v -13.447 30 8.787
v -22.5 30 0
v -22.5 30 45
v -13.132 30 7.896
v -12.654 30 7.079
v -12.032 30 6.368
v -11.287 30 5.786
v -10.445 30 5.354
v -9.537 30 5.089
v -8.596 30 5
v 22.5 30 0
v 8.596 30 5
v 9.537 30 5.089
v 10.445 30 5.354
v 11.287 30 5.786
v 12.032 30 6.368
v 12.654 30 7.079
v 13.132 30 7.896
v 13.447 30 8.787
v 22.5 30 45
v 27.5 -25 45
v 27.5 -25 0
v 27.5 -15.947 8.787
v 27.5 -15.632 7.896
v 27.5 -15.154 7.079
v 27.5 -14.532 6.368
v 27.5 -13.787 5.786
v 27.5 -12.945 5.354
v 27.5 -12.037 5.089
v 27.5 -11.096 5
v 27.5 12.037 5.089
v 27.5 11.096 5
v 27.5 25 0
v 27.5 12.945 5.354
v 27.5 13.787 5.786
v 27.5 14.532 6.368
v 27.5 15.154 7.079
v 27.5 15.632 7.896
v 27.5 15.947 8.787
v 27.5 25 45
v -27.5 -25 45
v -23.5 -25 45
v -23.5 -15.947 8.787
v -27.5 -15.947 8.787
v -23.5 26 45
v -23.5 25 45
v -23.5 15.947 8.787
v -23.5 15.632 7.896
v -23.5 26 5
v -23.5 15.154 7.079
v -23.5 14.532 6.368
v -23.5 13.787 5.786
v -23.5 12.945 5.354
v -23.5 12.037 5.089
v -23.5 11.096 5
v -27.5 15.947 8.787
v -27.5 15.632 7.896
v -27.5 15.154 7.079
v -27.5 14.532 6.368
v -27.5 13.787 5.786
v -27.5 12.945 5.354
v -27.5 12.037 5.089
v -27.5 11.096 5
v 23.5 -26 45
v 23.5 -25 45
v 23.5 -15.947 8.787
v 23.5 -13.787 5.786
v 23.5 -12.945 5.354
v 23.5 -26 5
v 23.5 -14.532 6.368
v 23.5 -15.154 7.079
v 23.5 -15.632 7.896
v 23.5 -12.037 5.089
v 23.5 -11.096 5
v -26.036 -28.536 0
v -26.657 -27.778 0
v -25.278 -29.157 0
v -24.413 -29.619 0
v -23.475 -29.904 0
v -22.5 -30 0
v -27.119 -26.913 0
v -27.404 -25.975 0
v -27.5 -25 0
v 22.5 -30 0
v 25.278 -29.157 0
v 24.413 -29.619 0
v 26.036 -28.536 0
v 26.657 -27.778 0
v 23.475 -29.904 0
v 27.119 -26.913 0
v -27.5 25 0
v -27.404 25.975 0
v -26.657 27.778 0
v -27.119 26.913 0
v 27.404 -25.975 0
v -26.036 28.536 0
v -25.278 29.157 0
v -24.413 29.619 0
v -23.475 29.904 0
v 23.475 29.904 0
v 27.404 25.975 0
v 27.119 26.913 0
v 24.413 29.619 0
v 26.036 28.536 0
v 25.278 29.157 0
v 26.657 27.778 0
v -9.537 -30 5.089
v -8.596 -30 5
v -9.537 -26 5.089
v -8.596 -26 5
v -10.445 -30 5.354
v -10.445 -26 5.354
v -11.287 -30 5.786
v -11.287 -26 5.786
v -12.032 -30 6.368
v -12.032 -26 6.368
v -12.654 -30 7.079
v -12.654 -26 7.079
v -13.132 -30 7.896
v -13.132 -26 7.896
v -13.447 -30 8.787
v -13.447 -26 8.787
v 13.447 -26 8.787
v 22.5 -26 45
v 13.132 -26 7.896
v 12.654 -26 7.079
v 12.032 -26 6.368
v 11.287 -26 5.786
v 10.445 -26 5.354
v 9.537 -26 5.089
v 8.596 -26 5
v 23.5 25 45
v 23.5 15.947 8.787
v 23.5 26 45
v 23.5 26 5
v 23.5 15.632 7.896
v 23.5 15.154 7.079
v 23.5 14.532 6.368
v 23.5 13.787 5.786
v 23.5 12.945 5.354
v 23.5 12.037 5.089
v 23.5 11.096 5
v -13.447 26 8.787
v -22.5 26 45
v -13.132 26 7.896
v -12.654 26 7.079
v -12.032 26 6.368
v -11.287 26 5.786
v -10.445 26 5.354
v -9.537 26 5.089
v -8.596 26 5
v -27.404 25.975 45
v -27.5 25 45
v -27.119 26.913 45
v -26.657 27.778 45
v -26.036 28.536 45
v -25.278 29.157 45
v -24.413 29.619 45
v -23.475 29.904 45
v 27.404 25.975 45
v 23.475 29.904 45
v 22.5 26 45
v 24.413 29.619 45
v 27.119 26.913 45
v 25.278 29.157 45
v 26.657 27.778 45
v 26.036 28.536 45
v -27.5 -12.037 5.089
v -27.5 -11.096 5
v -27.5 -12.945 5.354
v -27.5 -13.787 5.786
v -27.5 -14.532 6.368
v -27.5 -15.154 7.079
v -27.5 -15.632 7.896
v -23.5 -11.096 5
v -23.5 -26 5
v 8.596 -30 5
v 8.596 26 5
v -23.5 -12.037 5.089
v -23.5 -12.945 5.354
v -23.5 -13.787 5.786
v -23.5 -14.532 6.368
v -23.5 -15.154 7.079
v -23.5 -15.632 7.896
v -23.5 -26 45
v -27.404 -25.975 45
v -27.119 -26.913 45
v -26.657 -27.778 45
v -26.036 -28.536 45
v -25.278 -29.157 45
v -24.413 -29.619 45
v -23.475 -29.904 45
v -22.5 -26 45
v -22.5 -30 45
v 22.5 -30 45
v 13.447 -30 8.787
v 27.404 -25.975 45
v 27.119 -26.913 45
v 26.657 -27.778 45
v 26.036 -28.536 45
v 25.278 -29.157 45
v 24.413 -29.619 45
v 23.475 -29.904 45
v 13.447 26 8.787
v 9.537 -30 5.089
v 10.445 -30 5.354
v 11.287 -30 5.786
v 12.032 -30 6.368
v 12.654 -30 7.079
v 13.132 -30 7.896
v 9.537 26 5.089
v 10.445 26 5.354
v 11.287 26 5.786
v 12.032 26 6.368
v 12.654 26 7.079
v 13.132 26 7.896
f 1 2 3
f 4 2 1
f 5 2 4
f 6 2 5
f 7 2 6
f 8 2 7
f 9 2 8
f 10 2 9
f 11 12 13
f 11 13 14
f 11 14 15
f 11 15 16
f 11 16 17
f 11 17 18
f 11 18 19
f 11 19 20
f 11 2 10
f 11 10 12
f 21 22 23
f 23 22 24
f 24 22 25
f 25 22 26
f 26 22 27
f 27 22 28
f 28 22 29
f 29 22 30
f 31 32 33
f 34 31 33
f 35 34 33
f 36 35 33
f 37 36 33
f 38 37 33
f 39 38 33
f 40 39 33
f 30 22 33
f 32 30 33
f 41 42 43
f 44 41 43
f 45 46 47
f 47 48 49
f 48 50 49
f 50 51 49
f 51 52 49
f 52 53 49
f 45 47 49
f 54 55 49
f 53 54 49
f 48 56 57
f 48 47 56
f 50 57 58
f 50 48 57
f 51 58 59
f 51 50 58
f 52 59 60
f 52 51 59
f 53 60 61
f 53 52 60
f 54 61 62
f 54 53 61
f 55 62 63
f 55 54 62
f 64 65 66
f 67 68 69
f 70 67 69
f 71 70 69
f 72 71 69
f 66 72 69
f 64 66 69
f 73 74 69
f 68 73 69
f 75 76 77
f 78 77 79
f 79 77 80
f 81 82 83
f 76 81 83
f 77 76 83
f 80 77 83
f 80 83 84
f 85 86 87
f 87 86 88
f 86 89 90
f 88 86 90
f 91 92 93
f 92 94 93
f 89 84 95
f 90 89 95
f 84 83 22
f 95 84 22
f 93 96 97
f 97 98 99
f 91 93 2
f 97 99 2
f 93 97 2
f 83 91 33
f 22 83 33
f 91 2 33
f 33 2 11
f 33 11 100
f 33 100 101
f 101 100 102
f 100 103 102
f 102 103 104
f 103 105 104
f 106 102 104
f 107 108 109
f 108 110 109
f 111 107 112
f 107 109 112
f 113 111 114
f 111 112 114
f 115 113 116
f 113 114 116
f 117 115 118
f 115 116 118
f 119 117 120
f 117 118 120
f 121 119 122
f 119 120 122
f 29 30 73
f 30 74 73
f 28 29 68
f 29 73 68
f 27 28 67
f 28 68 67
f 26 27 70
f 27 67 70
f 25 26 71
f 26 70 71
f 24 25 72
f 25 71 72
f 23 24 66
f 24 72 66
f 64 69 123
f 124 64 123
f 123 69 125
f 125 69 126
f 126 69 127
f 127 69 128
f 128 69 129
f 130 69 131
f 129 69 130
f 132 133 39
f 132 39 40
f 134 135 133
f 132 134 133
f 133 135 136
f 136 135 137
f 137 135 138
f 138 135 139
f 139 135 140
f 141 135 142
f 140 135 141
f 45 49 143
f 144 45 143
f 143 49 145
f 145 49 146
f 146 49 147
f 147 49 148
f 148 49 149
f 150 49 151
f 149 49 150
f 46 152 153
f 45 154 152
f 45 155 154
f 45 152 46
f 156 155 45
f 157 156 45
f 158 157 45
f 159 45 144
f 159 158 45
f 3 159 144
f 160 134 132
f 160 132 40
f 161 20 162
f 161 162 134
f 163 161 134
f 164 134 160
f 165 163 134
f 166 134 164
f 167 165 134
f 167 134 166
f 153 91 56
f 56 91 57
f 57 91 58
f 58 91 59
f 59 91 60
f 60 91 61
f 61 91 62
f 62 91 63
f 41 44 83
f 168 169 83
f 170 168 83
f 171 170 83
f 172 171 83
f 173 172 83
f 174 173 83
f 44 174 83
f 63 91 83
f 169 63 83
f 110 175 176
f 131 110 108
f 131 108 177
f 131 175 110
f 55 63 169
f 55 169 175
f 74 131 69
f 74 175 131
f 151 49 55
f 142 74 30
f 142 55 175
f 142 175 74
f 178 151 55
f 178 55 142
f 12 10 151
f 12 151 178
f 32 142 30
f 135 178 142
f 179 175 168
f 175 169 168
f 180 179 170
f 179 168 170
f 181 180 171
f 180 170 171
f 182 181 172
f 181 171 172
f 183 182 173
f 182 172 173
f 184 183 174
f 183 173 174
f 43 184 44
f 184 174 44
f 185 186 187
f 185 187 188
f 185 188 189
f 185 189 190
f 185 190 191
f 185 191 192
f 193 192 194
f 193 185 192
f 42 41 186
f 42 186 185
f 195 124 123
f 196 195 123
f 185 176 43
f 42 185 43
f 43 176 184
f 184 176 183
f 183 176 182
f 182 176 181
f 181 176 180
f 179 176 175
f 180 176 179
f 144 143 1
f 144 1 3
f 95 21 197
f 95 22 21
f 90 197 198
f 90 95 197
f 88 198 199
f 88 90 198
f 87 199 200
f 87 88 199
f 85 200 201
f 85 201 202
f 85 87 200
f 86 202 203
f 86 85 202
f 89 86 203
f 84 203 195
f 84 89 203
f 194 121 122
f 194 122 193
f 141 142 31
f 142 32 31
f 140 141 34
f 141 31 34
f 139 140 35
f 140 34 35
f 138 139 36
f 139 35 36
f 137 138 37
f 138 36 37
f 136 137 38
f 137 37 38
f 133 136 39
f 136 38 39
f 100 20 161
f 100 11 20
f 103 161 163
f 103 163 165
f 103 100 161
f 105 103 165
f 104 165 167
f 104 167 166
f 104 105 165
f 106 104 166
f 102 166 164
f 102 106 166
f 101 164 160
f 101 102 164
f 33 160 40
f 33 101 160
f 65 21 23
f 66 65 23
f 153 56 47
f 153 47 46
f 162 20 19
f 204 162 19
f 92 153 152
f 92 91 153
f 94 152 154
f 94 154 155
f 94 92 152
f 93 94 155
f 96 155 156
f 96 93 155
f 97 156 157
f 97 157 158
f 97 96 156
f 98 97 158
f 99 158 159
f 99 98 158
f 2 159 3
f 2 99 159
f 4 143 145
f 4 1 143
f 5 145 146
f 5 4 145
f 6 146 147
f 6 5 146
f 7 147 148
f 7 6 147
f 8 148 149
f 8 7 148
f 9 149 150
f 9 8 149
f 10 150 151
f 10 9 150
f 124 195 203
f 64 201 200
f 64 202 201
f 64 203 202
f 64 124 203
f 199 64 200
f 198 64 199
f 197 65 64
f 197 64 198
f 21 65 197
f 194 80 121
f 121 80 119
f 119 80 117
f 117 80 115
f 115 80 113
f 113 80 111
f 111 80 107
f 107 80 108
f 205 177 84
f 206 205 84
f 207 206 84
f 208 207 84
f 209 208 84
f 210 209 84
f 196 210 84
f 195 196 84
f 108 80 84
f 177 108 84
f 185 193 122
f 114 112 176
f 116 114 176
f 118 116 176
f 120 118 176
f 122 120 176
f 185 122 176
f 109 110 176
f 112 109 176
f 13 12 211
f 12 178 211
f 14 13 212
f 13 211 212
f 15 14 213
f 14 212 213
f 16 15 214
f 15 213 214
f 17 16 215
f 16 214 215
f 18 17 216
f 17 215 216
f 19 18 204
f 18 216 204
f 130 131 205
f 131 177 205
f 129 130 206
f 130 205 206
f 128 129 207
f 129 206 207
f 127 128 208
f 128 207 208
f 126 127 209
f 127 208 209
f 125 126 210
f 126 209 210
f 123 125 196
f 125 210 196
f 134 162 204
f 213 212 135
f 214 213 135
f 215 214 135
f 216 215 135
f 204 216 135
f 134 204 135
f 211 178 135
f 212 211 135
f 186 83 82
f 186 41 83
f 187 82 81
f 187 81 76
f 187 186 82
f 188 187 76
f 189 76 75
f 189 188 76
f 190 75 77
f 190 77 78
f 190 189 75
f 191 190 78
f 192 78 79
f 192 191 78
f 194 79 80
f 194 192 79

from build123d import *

# Parameters (mm, degrees)
F0_W         = 55
F0_H         = 60
F1_DEPTH     = 5
F3_DEPTH     = 40
F5_T4_DEPTH  = 211.7701999818
F5_T9_DEPTH  = 211.7701999818
F5_T14_DEPTH = 211.7701999818
F5_T19_DEPTH = 211.7701999818
F5_T24_DEPTH = 211.7701999818
F5_T29_DEPTH = 211.7701999818
F5_T34_DEPTH = 211.7701999818
F5_T39_DEPTH = 211.7701999818
F7_R         = 5
F8_R         = 5


# Not quite as in the source:
# - a fillet or chamfer that OpenCascade refuses, or shapes differently, is made with other operations: its cross-section is extruded or revolved along the edge and cut away or added
# - two fillets or chamfers of one size are made in one step
# - a feature of the source that left no trace in its solid (it failed there, or was rolled back) is left out


with BuildPart() as f1:
    # F0 (on Top) → F1 (new body)
    with BuildSketch(Plane.XY):
        Rectangle(F0_W, F0_H)
    extrude(amount=F1_DEPTH)

    # F2 (on face) → F3 (join)
    with BuildSketch(Plane.XY.offset(5)):
        Polygon((-23.5, 15), (-23.5, 26), (-12.5, 26), (-12.5, 30), (-27.5, 30), (-27.5, 15), align=None)
        Polygon((12.5, 30), (12.5, 26), (23.5, 26), (23.5, 15), (27.5, 15), (27.5, 30), align=None)
        Polygon((23.5, -26), (12.5, -26), (12.5, -30), (27.5, -30), (27.5, -15), (23.5, -15), align=None)
        Polygon((-23.5, -26), (-23.5, -15), (-27.5, -15), (-27.5, -30), (-12.5, -30), (-12.5, -26), align=None)
    extrude(amount=F3_DEPTH)

    # F5: chamfer of 10 x 40 on 8 edges, made by hand


with BuildPart() as f5_tool2:
    # F5_s3 → F5_t4 (new body)
    with BuildSketch(Plane.YZ.offset(-131.3850999909)):
        Polygon((15, 5), (25, 45), (15, 45), align=None)
    extrude(amount=F5_T4_DEPTH)

    split(bisect_by=Plane.XY.offset(5), keep=Keep.TOP)


with BuildPart() as f1_1:
    add(f1.part)

    # F5_t1: cut F5_tool2
    add(f5_tool2.part, mode=Mode.SUBTRACT)


with BuildPart() as f5_tool7:
    # F5_s8 → F5_t9 (new body)
    with BuildSketch(Plane.XZ.offset(-77.8850999909)):
        Polygon((22.5, 45), (12.5, 5), (12.5, 45), align=None)
    extrude(amount=F5_T9_DEPTH)

    split(bisect_by=Plane.XY.offset(5), keep=Keep.TOP)


with BuildPart() as f1_2:
    add(f1_1.part)

    # F5_t6: cut F5_tool7
    add(f5_tool7.part, mode=Mode.SUBTRACT)


with BuildPart() as f5_tool12:
    # F5_s13 → F5_t14 (new body)
    with BuildSketch(Plane.YZ.offset(-80.3850999909)):
        Polygon((15, 5), (25, 45), (15, 45), align=None)
    extrude(amount=F5_T14_DEPTH)

    split(bisect_by=Plane.XY.offset(5), keep=Keep.TOP)


with BuildPart() as f1_3:
    add(f1_2.part)

    # F5_t11: cut F5_tool12
    add(f5_tool12.part, mode=Mode.SUBTRACT)


with BuildPart() as f5_tool17:
    # F5_s18 → F5_t19 (new body)
    with BuildSketch(Plane.XZ.offset(-133.8850999909)):
        Polygon((12.5, 5), (22.5, 45), (12.5, 45), align=None)
    extrude(amount=F5_T19_DEPTH)

    split(bisect_by=Plane.XY.offset(5), keep=Keep.TOP)


with BuildPart() as f1_4:
    add(f1_3.part)

    # F5_t16: cut F5_tool17
    add(f5_tool17.part, mode=Mode.SUBTRACT)


with BuildPart() as f5_tool22:
    # F5_s23 → F5_t24 (new body)
    with BuildSketch(Plane.YZ.offset(131.3850999909)):
        Polygon((-25, 45), (-15, 5), (-15, 45), align=None)
    extrude(amount=-F5_T24_DEPTH)

    split(bisect_by=Plane.XY.offset(5), keep=Keep.TOP)


with BuildPart() as f1_5:
    add(f1_4.part)

    # F5_t21: cut F5_tool22
    add(f5_tool22.part, mode=Mode.SUBTRACT)


with BuildPart() as f5_tool27:
    # F5_s28 → F5_t29 (new body)
    with BuildSketch(Plane.XZ.offset(133.8850999909)):
        Polygon((-12.5, 5), (-22.5, 45), (-12.5, 45), align=None)
    extrude(amount=-F5_T29_DEPTH)

    split(bisect_by=Plane.XY.offset(5), keep=Keep.TOP)


with BuildPart() as f1_6:
    add(f1_5.part)

    # F5_t26: cut F5_tool27
    add(f5_tool27.part, mode=Mode.SUBTRACT)


with BuildPart() as f5_tool32:
    # F5_s33 → F5_t34 (new body)
    with BuildSketch(Plane.YZ.offset(80.3850999909)):
        Polygon((-15, 5), (-25, 45), (-15, 45), align=None)
    extrude(amount=-F5_T34_DEPTH)

    split(bisect_by=Plane.XY.offset(5), keep=Keep.TOP)


with BuildPart() as f1_7:
    add(f1_6.part)

    # F5_t31: cut F5_tool32
    add(f5_tool32.part, mode=Mode.SUBTRACT)


with BuildPart() as f5_tool37:
    # F5_s38 → F5_t39 (new body)
    with BuildSketch(Plane.XZ.offset(77.8850999909)):
        Polygon((-22.5, 45), (-12.5, 5), (-12.5, 45), align=None)
    extrude(amount=-F5_T39_DEPTH)

    split(bisect_by=Plane.XY.offset(5), keep=Keep.TOP)


with BuildPart() as f1_8:
    add(f1_7.part)

    # F5_t36: cut F5_tool37
    add(f5_tool37.part, mode=Mode.SUBTRACT)

    # F7
    f7_edges = [f1_8.edges().sort_by_distance(p)[0] for p in [
        (-27.5, -30, 22.5),
        (27.5, -30, 22.5),
        (27.5, 30, 22.5),
        (-27.5, 30, 22.5),
    ]]
    fillet(f7_edges, radius=F7_R)

    # F8
    f8_edges = [f1_8.edges().sort_by_distance(p)[0] for p in [
        (12.5, -28, 5),
        (12.5, 28, 5),
        (25.5, 15, 5),
        (-25.5, 15, 5),
        (-12.5, 28, 5),
        (-25.5, -15, 5),
        (-12.5, -28, 5),
        (25.5, -15, 5),
    ]]
    fillet(f8_edges, radius=F8_R)


solid = f1_8.part
